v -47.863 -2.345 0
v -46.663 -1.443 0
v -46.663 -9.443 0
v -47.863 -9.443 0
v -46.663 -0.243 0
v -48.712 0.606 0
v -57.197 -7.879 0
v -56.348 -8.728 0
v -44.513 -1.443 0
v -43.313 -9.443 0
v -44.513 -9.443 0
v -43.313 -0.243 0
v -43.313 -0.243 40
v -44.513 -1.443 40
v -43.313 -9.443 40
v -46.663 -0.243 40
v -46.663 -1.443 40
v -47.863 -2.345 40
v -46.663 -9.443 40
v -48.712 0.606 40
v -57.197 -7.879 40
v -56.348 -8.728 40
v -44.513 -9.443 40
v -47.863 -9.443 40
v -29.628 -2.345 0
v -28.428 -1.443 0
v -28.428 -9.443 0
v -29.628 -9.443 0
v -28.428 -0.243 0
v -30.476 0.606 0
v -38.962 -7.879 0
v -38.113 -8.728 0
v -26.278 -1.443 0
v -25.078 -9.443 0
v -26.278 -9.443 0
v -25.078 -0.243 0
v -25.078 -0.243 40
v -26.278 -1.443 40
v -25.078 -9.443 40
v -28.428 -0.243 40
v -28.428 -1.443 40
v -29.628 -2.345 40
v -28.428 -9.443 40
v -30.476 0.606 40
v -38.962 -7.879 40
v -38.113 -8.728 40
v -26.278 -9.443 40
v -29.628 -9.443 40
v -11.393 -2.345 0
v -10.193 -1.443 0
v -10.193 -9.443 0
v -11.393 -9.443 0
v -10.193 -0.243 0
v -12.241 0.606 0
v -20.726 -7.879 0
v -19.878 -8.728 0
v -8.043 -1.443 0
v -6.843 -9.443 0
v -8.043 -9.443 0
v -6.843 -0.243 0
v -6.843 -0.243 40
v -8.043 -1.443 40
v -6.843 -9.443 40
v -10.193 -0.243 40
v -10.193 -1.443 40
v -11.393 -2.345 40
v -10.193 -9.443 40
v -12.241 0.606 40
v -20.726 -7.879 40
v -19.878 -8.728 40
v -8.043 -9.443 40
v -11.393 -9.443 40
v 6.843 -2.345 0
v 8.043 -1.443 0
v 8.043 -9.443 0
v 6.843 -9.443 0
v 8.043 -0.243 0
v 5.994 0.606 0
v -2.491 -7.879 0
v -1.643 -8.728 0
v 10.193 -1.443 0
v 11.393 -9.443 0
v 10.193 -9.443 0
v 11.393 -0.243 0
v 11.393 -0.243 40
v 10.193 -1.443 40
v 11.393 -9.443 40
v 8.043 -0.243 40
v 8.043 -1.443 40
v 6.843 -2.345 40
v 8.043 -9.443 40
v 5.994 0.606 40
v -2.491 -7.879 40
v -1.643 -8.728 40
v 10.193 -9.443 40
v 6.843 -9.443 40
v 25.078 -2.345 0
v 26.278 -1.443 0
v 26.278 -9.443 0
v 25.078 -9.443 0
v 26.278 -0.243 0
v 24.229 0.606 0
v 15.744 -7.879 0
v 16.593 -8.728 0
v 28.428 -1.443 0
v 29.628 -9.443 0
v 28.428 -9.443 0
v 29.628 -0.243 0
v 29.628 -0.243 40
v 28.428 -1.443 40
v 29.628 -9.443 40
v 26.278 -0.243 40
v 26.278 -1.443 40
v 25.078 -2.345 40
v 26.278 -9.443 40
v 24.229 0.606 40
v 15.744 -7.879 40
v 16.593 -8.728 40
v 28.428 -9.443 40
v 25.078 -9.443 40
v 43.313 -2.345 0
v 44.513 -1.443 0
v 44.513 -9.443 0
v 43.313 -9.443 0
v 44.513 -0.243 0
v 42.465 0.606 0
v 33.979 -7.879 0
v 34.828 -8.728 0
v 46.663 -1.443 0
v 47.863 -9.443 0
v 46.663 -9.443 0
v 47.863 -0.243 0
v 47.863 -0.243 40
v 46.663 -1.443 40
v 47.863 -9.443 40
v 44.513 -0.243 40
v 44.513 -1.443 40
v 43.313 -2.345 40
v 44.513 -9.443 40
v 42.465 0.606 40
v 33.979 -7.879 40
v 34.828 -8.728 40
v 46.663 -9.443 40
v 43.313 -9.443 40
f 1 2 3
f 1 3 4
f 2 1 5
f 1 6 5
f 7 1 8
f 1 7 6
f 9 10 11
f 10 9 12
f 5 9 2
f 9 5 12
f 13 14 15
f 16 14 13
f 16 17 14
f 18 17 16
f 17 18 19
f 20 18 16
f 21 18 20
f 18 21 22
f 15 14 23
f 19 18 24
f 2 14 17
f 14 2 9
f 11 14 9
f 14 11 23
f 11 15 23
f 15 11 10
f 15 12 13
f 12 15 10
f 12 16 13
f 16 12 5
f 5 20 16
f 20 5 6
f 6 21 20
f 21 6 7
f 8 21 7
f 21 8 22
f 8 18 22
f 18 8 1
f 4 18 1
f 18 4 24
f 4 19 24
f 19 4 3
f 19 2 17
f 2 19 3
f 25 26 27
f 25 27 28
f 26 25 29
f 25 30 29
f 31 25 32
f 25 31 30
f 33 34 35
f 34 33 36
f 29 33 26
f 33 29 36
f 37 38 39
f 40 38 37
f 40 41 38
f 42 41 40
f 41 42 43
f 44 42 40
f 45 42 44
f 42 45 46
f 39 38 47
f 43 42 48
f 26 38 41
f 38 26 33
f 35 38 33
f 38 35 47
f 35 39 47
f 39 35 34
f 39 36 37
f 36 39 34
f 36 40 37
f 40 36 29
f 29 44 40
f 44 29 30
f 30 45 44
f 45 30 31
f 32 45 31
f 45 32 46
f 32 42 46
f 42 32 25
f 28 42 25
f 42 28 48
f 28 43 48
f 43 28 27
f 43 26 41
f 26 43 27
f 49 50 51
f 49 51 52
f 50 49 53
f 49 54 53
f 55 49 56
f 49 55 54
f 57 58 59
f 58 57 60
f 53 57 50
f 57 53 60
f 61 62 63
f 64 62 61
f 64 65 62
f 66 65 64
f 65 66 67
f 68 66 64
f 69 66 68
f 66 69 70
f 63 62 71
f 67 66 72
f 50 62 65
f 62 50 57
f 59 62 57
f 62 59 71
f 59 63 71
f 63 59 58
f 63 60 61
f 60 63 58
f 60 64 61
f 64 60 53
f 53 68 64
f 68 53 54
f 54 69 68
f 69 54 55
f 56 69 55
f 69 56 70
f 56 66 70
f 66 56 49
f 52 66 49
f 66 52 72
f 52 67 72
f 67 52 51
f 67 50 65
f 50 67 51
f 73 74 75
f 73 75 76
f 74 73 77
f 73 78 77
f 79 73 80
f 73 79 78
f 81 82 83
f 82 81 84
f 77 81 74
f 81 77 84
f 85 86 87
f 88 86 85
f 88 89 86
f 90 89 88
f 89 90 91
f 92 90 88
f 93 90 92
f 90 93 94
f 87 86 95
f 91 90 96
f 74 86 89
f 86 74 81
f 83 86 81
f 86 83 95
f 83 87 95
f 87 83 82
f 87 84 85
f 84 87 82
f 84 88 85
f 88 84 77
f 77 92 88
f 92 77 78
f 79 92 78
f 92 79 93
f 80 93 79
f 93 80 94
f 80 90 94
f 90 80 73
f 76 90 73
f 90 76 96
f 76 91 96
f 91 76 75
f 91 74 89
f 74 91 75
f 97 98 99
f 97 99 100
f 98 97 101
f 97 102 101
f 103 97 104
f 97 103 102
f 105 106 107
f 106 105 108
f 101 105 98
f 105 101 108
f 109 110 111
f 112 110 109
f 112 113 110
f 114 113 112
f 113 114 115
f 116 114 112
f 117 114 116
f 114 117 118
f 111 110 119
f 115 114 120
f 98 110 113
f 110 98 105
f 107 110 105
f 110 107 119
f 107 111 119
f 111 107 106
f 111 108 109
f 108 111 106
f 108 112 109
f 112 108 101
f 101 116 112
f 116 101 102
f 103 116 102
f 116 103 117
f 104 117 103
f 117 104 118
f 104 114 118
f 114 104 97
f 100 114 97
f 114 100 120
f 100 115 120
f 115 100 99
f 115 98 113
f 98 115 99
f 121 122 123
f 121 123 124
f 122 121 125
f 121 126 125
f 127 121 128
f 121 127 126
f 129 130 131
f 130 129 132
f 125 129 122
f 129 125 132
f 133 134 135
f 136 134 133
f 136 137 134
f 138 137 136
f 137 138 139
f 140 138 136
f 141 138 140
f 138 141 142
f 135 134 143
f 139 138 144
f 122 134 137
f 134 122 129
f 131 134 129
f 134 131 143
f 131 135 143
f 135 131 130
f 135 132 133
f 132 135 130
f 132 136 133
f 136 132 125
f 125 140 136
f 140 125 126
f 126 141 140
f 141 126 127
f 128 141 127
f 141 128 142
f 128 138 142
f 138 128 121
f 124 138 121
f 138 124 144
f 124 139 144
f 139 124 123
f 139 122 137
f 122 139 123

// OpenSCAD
// Deutsche Version – automatisch erzeugt aus scad/label_clip.scad
// The Drawer Dividers V3 – Label clip
// Slides onto the top edge of a wall: write on it, add a sticker or engrave a text.

/* [Bauteil] */
// Text, der in die Schreibfläche graviert wird (leer = zum Beschriften)
Clip_Beschriftung = "";
// Breite des Clips entlang der Wand (mm)
Clip_Breite = 40; // [15:1:120]
// Höhe der schrägen Schreibfläche (mm)
Schildhoehe = 12; // [6:0.5:30]
// Neigung der Schreibfläche (Grad, 0 = senkrecht)
Schildwinkel = 45; // [0:5:80]
// Wie weit der Clip die Wand hinunter greift (mm)
Klemmtiefe = 8; // [3:0.5:20]
// Textgröße (mm)
Textgroesse = 5; // [2:0.5:15]
// Wie viele Teile auf dem Druckbett
Anzahl = 6; // [1:1:40]
// Abstand zwischen den Teilen (mm)
Abstand = 4; // [1:1:20]

/* [System] */
// Exakte Dicke deiner gedruckten Trennwände (mm)
Wand_Dicke = 2.0; // [0.8:0.1:10]
// Materialstärke des Clips (mm)
Clip_Wandstaerke = 1.2; // [0.6:0.1:3]
// Zusätzlicher Platz für die Wand – kleiner = strammer (mm)
Clip_Spiel = 0.15; // [0:0.05:0.6]

/* [Hidden] */
Clip_Text = Clip_Beschriftung;
Clip_Width = Clip_Breite;
Face_Height = Schildhoehe;
Face_Angle = Schildwinkel;
Grip_Depth = Klemmtiefe;
Text_Size = Textgroesse;
Count = Anzahl;
Spacing = Abstand;
Wall_Thickness = Wand_Dicke;
Clip_Wall = Clip_Wandstaerke;
Clip_Fit = Clip_Spiel;
$fn = 32;

P = dd_profile(wall_t = Wall_Thickness);
sz = dd_label_clip_size(P, Face_Height, Face_Angle, Grip_Depth, Clip_Wall);
dd_grid(Count, sz[0] + Spacing, sz[1] + Spacing)
    translate([0, Grip_Depth - sz[1] / 2, 0])
        dd_label_clip(Clip_Width, P, face = Face_Height, angle = Face_Angle, grip = Grip_Depth,
                      wall = Clip_Wall, fit = Clip_Fit, label = Clip_Text, text_size = Text_Size);

// ============================================================================
//  Library (scad/lib/drawer_divider.scad, inlined by tools/build.py)
// ============================================================================
// =============================================================================
//  The Drawer Dividers – core library (V3)
//  Usage:  use <lib/drawer_divider.scad>
//  All dimensions in mm. This file creates no geometry on its own.
// =============================================================================

DD_VERSION = "3.0.0";
DD_EPS = 0.01;

// =============================================================================
//  System profile
// =============================================================================
// Every part of one drawer is built from the same profile, so walls,
// connectors and rails always fit each other. A profile is a key/value list;
// read single values with dd(p, "key").

function dd_profile(
    wall_t   = 2.0,  // thickness of the printed walls
    tol      = 0.2,  // extra slot width so the wall does not bind
    height   = 40,   // connector height
    insert   = 14,   // how deep a wall slides into a connector arm
    shell    = 2.5,  // connector material left and right of the slot
    arm      = 20,   // arm length, measured from the connector centre
    fillet   = 10,   // inner fillet radius between two arms
    edge_r   = 0.6,  // rounding of the outer vertical edges
    cap      = 0,    // closed cap; 0 = slots open on both ends
    floor_t  = 2,    // cap thickness of slip-on connectors
    lead_in  = 1,    // chamfer at the open slot end
    efc      = 0.4,  // elephant foot compensation at the bed side
    magnet_d = 5,    // magnet / rubber foot pocket, 0 = off
    magnet_h = 2,
    end_gap  = 0.3,  // gap between wall end and pocket bottom
    top_gap  = 0.2   // gap between wall top and cap (capped connectors only)
) = [
    ["wall_t", wall_t], ["tol", tol], ["height", height], ["insert", insert],
    ["shell", shell], ["arm", arm], ["fillet", fillet], ["edge_r", edge_r],
    ["cap", cap], ["floor_t", floor_t], ["lead_in", lead_in], ["efc", efc],
    ["magnet_d", magnet_d], ["magnet_h", magnet_h], ["end_gap", end_gap],
    ["top_gap", top_gap]
];

function dd(p, key) =
    let(i = search([key], p)[0])
    assert(is_num(i), str("dd(): unknown profile key '", key, "'"))
    p[i][1];

// ---- derived values (the designer uses the same formulas) -------------------
// centre distance two connectors on one wall need so their arms do not collide
function dd_min_conn_gap(p) = 2 * dd(p, "arm") + 1;
function dd_slot_w(p)       = dd(p, "wall_t") + dd(p, "tol");
function dd_arm_w(p)        = dd_slot_w(p) + 2 * dd(p, "shell");
function dd_pocket_start(p) = dd(p, "arm") - dd(p, "insert");
// distance from a connector centre to the end of a fully inserted wall
function dd_wall_inset(p)   = dd_pocket_start(p) + dd(p, "end_gap");
function dd_cap(p, slip = false) =
    slip ? max(dd(p, "cap"), dd(p, "floor_t")) : dd(p, "cap");
function dd_wall_height(p, slip = false) =
    let(c = dd_cap(p, slip))
    dd(p, "height") - (c > 0 ? c + dd(p, "top_gap") : 0);
// wall length for two connector centres `center_dist` apart
function dd_wall_length(center_dist, p, ends = 2) =
    center_dist - ends * dd_wall_inset(p);

// =============================================================================
//  Connectors
// =============================================================================
// Directions: 0 = +X, 1 = +Y, 2 = -X, 3 = -Y.
// Definition: [arms, slots, through_y, slip_on]
//   through_y: one continuous slot along Y (the wall passes straight through)
//   slip_on:   printed cap-down, then flipped and pushed onto the walls

function dd_connector_types() = ["cross", "tee", "corner", "corner_round", "straight", "end",
                                  "slip_cross", "slip_tee", "slip_corner_r", "slip_corner_l"];

function dd_connector_def(type) =
    type == "cross"         ? [[1,1,1,1], [1,1,1,1], false, false] :
    type == "tee"           ? [[1,1,1,0], [1,1,1,0], false, false] :
    type == "corner"        ? [[1,1,0,0], [1,1,0,0], false, false] :
    type == "corner_round"  ? [[1,1,0,0], [1,1,0,0], false, false] :   // frame corner, use corner_r
    type == "straight"      ? [[1,0,1,0], [1,0,1,0], false, false] :
    type == "end"           ? [[1,0,0,0], [1,0,0,0], false, false] :
    type == "slip_cross"    ? [[1,1,1,1], [1,1,1,1], true,  true ] :
    type == "slip_tee"      ? [[1,1,0,1], [1,1,0,1], true,  true ] :
    type == "slip_corner_r" ? [[1,1,0,0], [1,1,0,1], true,  true ] :
    type == "slip_corner_l" ? [[0,1,1,0], [0,1,1,1], true,  true ] :
    undef;

// slip = true: part of a slip-on set. Every connector of the set gets the cap and
// is pushed on from above, also where the walls end instead of running through.
// corner_r rounds the outer corner, so a frame corner fits a drawer with rounded
// corners (see dd_corner_r_max()).
module dd_connector(type = "cross", p = dd_profile(), slip = false, corner_r = 0) {
    def = dd_connector_def(type);
    assert(!is_undef(def), str("dd_connector(): unknown type '", type, "'"));
    dd_connector_custom(arms = def[0], slots = def[1], through_y = def[2],
                        cap = dd_cap(p, def[3] || slip), p = p, corner_r = corner_r);
}

// largest outer corner radius that still leaves 0.8 mm beside the slots
function dd_corner_r_max(p) =
    let(a = dd_arm_w(p) / 2, dx = dd_pocket_start(p) + a, dy = a - dd_slot_w(p) / 2 - 0.8)
    dy <= 0 ? dx : dx + dy + sqrt(2 * dx * dy);

// Build any connector from an arm/slot pattern.
module dd_connector_custom(arms = [1,1,1,1], slots = undef, through_y = false,
                           cap = 0, p = dd_profile(), corner_r = 0) {
    sl  = is_undef(slots) ? arms : slots;
    h   = dd(p, "height");
    aw  = dd_arm_w(p);
    arm = dd(p, "arm");
    ps  = dd_pocket_start(p);
    md  = dd(p, "magnet_d");
    z0  = cap > 0 ? cap : -1;   // slots start above the cap

    difference() {
        linear_extrude(h) dd_connector_outline(arms, p, corner_r);

        for (i = [0:3]) if (sl[i] && !(through_y && i == 3))
            rotate(90 * i)
                dd_slot_cut(x0 = (through_y && i == 1) ? -(arm + 1) : ps,
                            x1 = arm + 1, z0 = z0, p = p);

        // magnet pocket on the side that faces the drawer floor in use
        if (!through_y && md > 0 && md <= min(aw, 2 * ps) - 1) {
            mh = dd(p, "magnet_h");
            if (cap > 0) translate([0, 0, h - mh]) cylinder(d = md, h = mh + 1, $fn = 48);
            else translate([0, 0, -DD_EPS]) cylinder(d = md, h = mh + DD_EPS, $fn = 48);
        }
    }
}

module dd_connector_outline(arms, p, corner_r = 0) {
    aw = dd_arm_w(p);
    rc = min(corner_r, dd_corner_r_max(p));
    difference() {
        dd_round_convex(dd(p, "edge_r"))
        // a fillet longer than the free arm would swallow the arm ends
        dd_round_concave(min(dd(p, "fillet"), dd(p, "arm") - aw / 2))
        union() {
            square(aw, center = true);
            for (i = [0:3]) if (arms[i])
                rotate(90 * i) translate([0, -aw / 2]) square([dd(p, "arm"), aw]);
        }
        // outer corners between two missing arms
        if (rc > 0) for (i = [0:3]) if (!arms[i] && !arms[(i + 1) % 4])
            rotate(90 * i) translate([aw / 2 - rc, aw / 2 - rc]) difference() {
                square(rc + 1);
                circle(r = rc, $fn = 64);
            }
    }
}

// one slot along +X from x0 to x1, open at the top
module dd_slot_cut(x0, x1, z0, p) {
    h    = dd(p, "height");
    sw   = dd_slot_w(p);
    li   = dd(p, "lead_in");
    efc  = dd(p, "efc");
    len  = x1 - x0;

    translate([x0, -sw / 2, z0]) cube([len, sw, h - z0 + 1]);

    if (li > 0) hull() {
        translate([x0, -sw / 2, h - li]) cube([len, sw, DD_EPS]);
        translate([x0, -sw / 2 - li, h]) cube([len, sw + 2 * li, 1]);
    }
    // only where the slot touches the print bed
    if (z0 < 0 && efc > 0) hull() {
        translate([x0, -sw / 2 - efc, -1]) cube([len, sw + 2 * efc, 1]);
        translate([x0, -sw / 2, efc]) cube([len, sw, DD_EPS]);
    }
}

// footprint size, used to space copies on the plate
function dd_connector_size(p) = 2 * dd(p, "arm");

// A connector as it sits in the drawer (cap on top), for assembly previews.
// The slots stay open so the walls show inside them; through = "x"|"y"|"" for slip-on.
module dd_connector_installed(arms, through = "", cap = 0, p = dd_profile(), corner_r = 0) {
    h   = dd(p, "height");
    arm = dd(p, "arm");
    ps  = dd_pocket_start(p);
    sw  = dd_slot_w(p);
    linear_extrude(h - cap) difference() {
        dd_connector_outline(arms, p, corner_r);
        for (i = [0:3]) if (arms[i])
            rotate(90 * i) translate([ps, -sw / 2]) square([arm + 1 - ps, sw]);
        if (through != "")
            rotate(through == "x" ? 0 : 90) square([2 * arm + 2, sw], center = true);
    }
    if (cap > 0) translate([0, 0, h - cap]) linear_extrude(cap) dd_connector_outline(arms, p, corner_r);
}

// =============================================================================
//  Walls
// =============================================================================
// Built standing: X = length, Y = thickness (centred), Z = height.

// label / label2: engraved into the wall ends that disappear in the connectors,
// label upright at +X (the parts-list letter), label2 running upwards at -X (the length).
module dd_wall(length, p = dd_profile(), height = undef, pattern = "none",
               cell = 8, web = 2, margin_side = -1, margin_tb = 5,
               end_chamfer = 0.5, grip = 0, label = "", label2 = "") {
    h  = is_undef(height) ? dd_wall_height(p) : height;
    t  = dd(p, "wall_t");
    // keep the pattern out of the connector pockets
    ms = margin_side < 0 ? dd(p, "insert") + 2 : margin_side;

    difference() {
        linear_extrude(h) dd_wall_2d(length, t, end_chamfer);
        dd_wall_pattern(length, t, h, pattern, cell, web, ms,
                        margin_tb, margin_tb + grip);
        if (grip > 0)
            translate([0, 0, h]) rotate([90, 0, 0])
                cylinder(r = grip, h = t + 2, center = true, $fn = 48);
        dd_wall_labels(length, t, h, dd(p, "insert") - dd(p, "end_gap"), label, label2);
    }
}

module dd_wall_labels(l, t, h, lw, label, label2) {
    dep = min(0.4, t / 4);
    both = l >= 2 * lw + 2;
    module engrave(x, z, s, txt, up)
        translate([x, -t / 2 + dep, z]) rotate([90, 0, 0]) linear_extrude(dep + 1)
            rotate(up ? 90 : 0) text(txt, size = s, halign = "center", valign = "center");
    if (label != "") {
        s = min(7, (both ? lw : l) - 4, h / 3);
        if (s >= 2) engrave(both ? l / 2 - lw / 2 : 0, h / 2, s, label, false);
    }
    if (label2 != "" && both) {
        s = min(4, lw - 4, (h - 8) / (0.75 * len(label2) + 1));
        if (s >= 2) engrave(-l / 2 + lw / 2, h / 2, s, label2, true);
    }
}

module dd_wall_2d(l, t, c) {
    ce = min(c, t / 2 - 0.01);
    if (ce > 0)
        polygon([
            [-l/2 + ce, -t/2], [ l/2 - ce, -t/2], [ l/2, -t/2 + ce], [ l/2,  t/2 - ce],
            [ l/2 - ce,  t/2], [-l/2 + ce,  t/2], [-l/2,  t/2 - ce], [-l/2, -t/2 + ce]
        ]);
    else
        square([l, t], center = true);
}

// Hex or circle pattern with a constant web between the holes.
module dd_wall_pattern(l, t, h, pattern, cell, web, ms, mb, mt) {
    if (pattern == "hex" || pattern == "circle") {
        hex   = pattern == "hex";
        D     = hex ? cell * sqrt(3) + web : 2 * cell + web;  // vertical pitch
        ext_x = cell;
        ext_z = hex ? cell * sqrt(3) / 2 : cell;
        max_w = l - 2 * ms - 2 * ext_x;
        max_h = h - mb - mt - 2 * ext_z;
        stagger = max_h >= D / 2;
        sx    = stagger ? D * sqrt(3) / 2 : 2 * cell + web;
        cols  = max_w >= 0 ? floor(max_w / sx) + 1 : 0;
        st    = stagger && cols > 1;
        rows  = max_h >= 0 ? floor((max_h - (st ? D / 2 : 0)) / D) + 1 : 0;

        if (cols > 0 && rows > 0) {
            pw = (cols - 1) * sx;
            ph = (rows - 1) * D + (st ? D / 2 : 0);
            z0 = mb + ext_z + (max_h - ph) / 2;
            for (c = [0 : cols - 1], r = [0 : rows - 1])
                translate([-pw / 2 + c * sx, 0, z0 + r * D + (st && c % 2 == 1 ? D / 2 : 0)])
                    rotate([90, 0, 0])
                        cylinder(r = cell, h = t + 2, center = true, $fn = hex ? 6 : 32);
        }
    }
}

// =============================================================================
//  Rails ("Raster Wall") – glued or screwed to the drawer side
// =============================================================================
// Built flat: X = length, Y = width (= height in the drawer), Z = thickness.
// Teeth form slots of the system slot width. teeth_offset = position of the
// first tooth from x = 0; -1 centres the pattern. Joined rails use explicit
// offsets so the slot pitch continues across the joint.

function dd_rail_pitch(p, tooth_t = 2) = tooth_t + dd_slot_w(p);

function dd_rail_center_offset(length, p, tooth_t = 2) =
    let(sw = dd_slot_w(p), pitch = tooth_t + sw,
        n = max(1, floor((length + sw) / pitch)),
        used = n * tooth_t + (n - 1) * sw)
    (length - used) / 2;

module dd_rail(length, width, p = dd_profile(), plate = 2.5, tooth_t = 2,
               tooth_h = 6, tooth_chamfer = 0.6, tooth_fillet = 0.5,
               teeth_offset = -1, teeth = true, tongue = true, socket = true,
               tongue_len = 2, tongue_w = -1, tongue_chamfer = 1,
               tol_w = 1, tol_d = 0.5, tol_z = 0.1,
               screws = 3, screw_d = 3.2, head_d = 6.5) {
    sw    = dd_slot_w(p);
    pitch = tooth_t + sw;
    x0    = teeth_offset >= 0 ? teeth_offset : dd_rail_center_offset(length, p, tooth_t);
    n     = floor((length - x0 - tooth_t) / pitch) + 1;
    tw    = tongue_w < 0 ? max(width - 12, width * 0.6) : min(tongue_w, width - 4);
    zt    = plate / 2 - tol_z / 2;
    zs    = plate / 2 + tol_z / 2;

    difference() {
        union() {
            cube([length, width, plate]);
            if (tongue)
                translate([length, (width - tw) / 2, 0]) linear_extrude(zt)
                    polygon([[0, 0], [tongue_len, tongue_chamfer],
                             [tongue_len, tw - tongue_chamfer], [0, tw]]);
            if (teeth && n > 0)
                for (i = [0 : n - 1])
                    translate([x0 + i * pitch, 0, plate - DD_EPS])
                        dd_rail_tooth(width, tooth_t, tooth_h, tooth_chamfer, tooth_fillet);
        }
        if (socket) {
            bw = tw + 2 * tol_w;
            translate([-DD_EPS, (width - bw) / 2, -DD_EPS])
                cube([tongue_len + tol_d + DD_EPS, bw, zs + DD_EPS]);
        }
        // screws sit in the middle of a slot so they damage as few teeth as possible
        if (screws > 0) for (s = [1 : screws]) {
            // nearest slot, kept on the rail when it is short
            k  = max(0, min(n - 2, round((length * s / (screws + 1) - x0 - tooth_t - sw / 2) / pitch)));
            xs = x0 + tooth_t + sw / 2 + k * pitch;
            cs = min(1.5, plate - 0.4);
            translate([xs, width / 2, 0]) {
                translate([0, 0, -1]) cylinder(d = screw_d, h = plate + 2, $fn = 32);
                translate([0, 0, plate - cs]) cylinder(d1 = screw_d, d2 = head_d, h = cs + DD_EPS, $fn = 32);
                translate([0, 0, plate]) cylinder(d = head_d + 0.5, h = tooth_h + 1, $fn = 32);
            }
        }
    }
}

// One tooth across the full rail width, with lead-in chamfer and base fillets.
// Keep tooth_fillet <= the wall end chamfer so walls still reach the plate.
module dd_rail_tooth(width, tt, th, ch, fr) {
    c = max(0, min(ch, tt / 2 - 0.2, th - 0.5));
    translate([0, width, 0]) rotate([90, 0, 0]) linear_extrude(width) {
        polygon([[0, 0], [tt, 0], [tt, th - c], [tt - c, th], [c, th], [0, th - c]]);
        if (fr > 0) {
            translate([tt, 0]) dd_fillet_2d(fr);
            mirror([1, 0]) dd_fillet_2d(fr);
        }
    }
}

// =============================================================================
//  Label clip
// =============================================================================
// Slides onto the top edge of a wall; the slanted face takes a marker, a sticker
// or an engraved text. Built in print orientation: the profile lies on the bed
// (X = across the wall, Y = up in use) and is extruded by the clip width.

module dd_label_clip(width = 40, p = dd_profile(), face = 12, angle = 45, grip = 8,
                     wall = 1.2, fit = 0.15, label = "", text_size = 5) {
    gap = dd(p, "wall_t") + fit;
    d   = [-cos(angle), -sin(angle)];   // down the face, away from the wall
    n   = [-sin(angle),  cos(angle)];   // face normal
    hp  = [-gap / 2 - wall, wall];      // hinge: top front corner of the clip
    difference() {
        linear_extrude(width) {
            difference() {
                translate([-gap / 2 - wall, -grip]) square([gap + 2 * wall, grip + wall]);
                translate([-gap / 2, -grip - 1]) square([gap, grip + 1]);
            }
            // the hull fills the joint, so face and clip share more than one edge
            hull() {
                translate(hp - [0, wall]) square([wall, wall]);
                polygon([hp, hp + face * d, hp + face * d + wall * n, hp + wall * n]);
            }
        }
        if (label != "") {
            c = hp + wall * n + d * face / 2;
            dep = min(0.4, wall / 3);
            multmatrix([[0, -d[0], n[0], c[0]], [0, -d[1], n[1], c[1]], [1, 0, 0, width / 2], [0, 0, 0, 1]])
                translate([0, 0, -dep]) linear_extrude(dep + 1)
                    text(label, size = min(text_size, face - 3), halign = "center", valign = "center");
        }
    }
}

// footprint of one clip on the bed (x, y)
function dd_label_clip_size(p, face = 12, angle = 45, grip = 8, wall = 1.2) =
    [dd(p, "wall_t") + 0.15 + 2 * wall + face * cos(angle) + wall, grip + wall + face * sin(angle) + wall];

// =============================================================================
//  Tolerance test
// =============================================================================
// A bar with one slot per tolerance (value engraved next to it) plus a short
// test wall. Print both, find the slot that fits best, use that tolerance.

module dd_tolerance_test(p = dd_profile(), tols = [0.1, 0.15, 0.2, 0.25, 0.3],
                         height = 12, depth = 20, land = 8, base = 1.2,
                         coupon = true) {
    t = dd(p, "wall_t");
    n = len(tols);
    function x_at(i) = land * (i + 1) + i * t + dd_sum(tols, i);
    L = x_at(n);

    difference() {
        cube([L, depth, height]);
        for (i = [0 : n - 1]) {
            translate([x_at(i), -1, base]) cube([t + tols[i], depth + 2, height]);
            translate([x_at(i) - land / 2, depth / 2, height - 0.6])
                linear_extrude(1) rotate(90)
                    text(str(tols[i]), size = min(3.2, land * 0.42),
                         halign = "center", valign = "center");
        }
    }
    if (coupon)
        translate([L / 2, depth + 8, 0])
            dd_wall(30, p, height = height + 4, end_chamfer = 0.3);
}

// =============================================================================
//  Helpers
// =============================================================================

function dd_sum(v, n) = n <= 0 ? 0 : v[n - 1] + dd_sum(v, n - 1);

module dd_round_concave(r) { if (r > 0) offset(r = -r) offset(r = r) children(); else children(); }
module dd_round_convex(r)  { if (r > 0) offset(r = r) offset(delta = -r) children(); else children(); }

module dd_fillet_2d(r) {
    difference() {
        square([r, r]);
        translate([r, r]) circle(r = r, $fn = 24);
    }
}

// Arrange `count` copies of the child in rows that fit max_w, centred on the origin.
module dd_grid(count, pitch_x, pitch_y, max_w = 240) {
    cols = max(1, min(count, floor((max_w + DD_EPS) / pitch_x)));
    rows = ceil(count / cols);
    for (i = [0 : count - 1])
        translate([((i % cols) - (cols - 1) / 2) * pitch_x,
                   (floor(i / cols) - (rows - 1) / 2) * pitch_y, 0])
            children();
}

// Lay a standing wall flat on the bed.
module dd_lay_flat(t) { translate([0, 0, t / 2]) rotate([90, 0, 0]) children(); }

// =============================================================================
//  Drawer layout – used by drawer_designer.scad
// =============================================================================
// The drawer is cut into strips (u axis), each strip into compartments
// (v axis). Strip walls run through from edge to edge. Strips run front to
// back unless `swap` is set. dd_layout() works in u/v and returns world
// coordinates: x = width, y = depth, front edge at y = 0.
// Directions: 0 = +X, 1 = +Y, 2 = -X, 3 = -Y.

function dd_le() = 0.01;   // a function, so inlined single files can use it before this line

// ---- string parsing ("1,1,2" and "2,1:2") ----------------------------------
function dd_str_split(s, sep, i = 0, cur = "", acc = []) =
    i >= len(s) ? concat(acc, [cur])
  : s[i] == sep ? dd_str_split(s, sep, i + 1, "", concat(acc, [cur]))
  : dd_str_split(s, sep, i + 1, str(cur, s[i]), acc);

function dd_str_num(s) = dd__num([for (c = s) if (c != " ") c], 0, 0, 0, 1);
function dd__num(c, i, v, frac, sign) =
    i >= len(c) ? sign * v
  : c[i] == "-" ? dd__num(c, i + 1, v, frac, -1)
  : c[i] == "." ? dd__num(c, i + 1, v, max(frac, 0.1), sign)
  : let(d = ord(c[i]) - 48)
    d < 0 || d > 9 ? dd__num(c, i + 1, v, frac, sign)
  : frac > 0 ? dd__num(c, i + 1, v + d * frac, frac / 10, sign)
             : dd__num(c, i + 1, v * 10 + d, 0, sign);

// "1,1,2" -> [1,1,2]
function dd_parse_weights(s) =
    let(v = [for (p = dd_str_split(s, ",")) let(n = dd_str_num(p)) if (n > 0) n])
    len(v) ? v : [1];

// "2,1:2" -> one weight list per strip; a plain number n = n equal parts.
// Missing entries repeat the last one.
function dd_parse_splits(s, n) =
    let(per = [for (it = dd_str_split(s, ","))
                  let(p = [for (x = dd_str_split(it, ":")) let(v = dd_str_num(x)) if (v > 0) v])
                  len(p) == 0 ? [1]
                : len(p) == 1 ? [for (k = [1 : max(1, round(p[0]))]) 1] : p])
    [for (i = [0 : n - 1]) per[min(i, len(per) - 1)]];

// ---- small list helpers ----------------------------------------------------
function dd_has_num(l, x) = len([for (y = l) if (abs(y - x) < dd_le()) 1]) > 0;
function dd_sort(a) =
    len(a) <= 1 ? a :
    let(p = a[floor(len(a) / 2)])
    concat(dd_sort([for (x = a) if (x < p) x]), [for (x = a) if (x == p) x], dd_sort([for (x = a) if (x > p) x]));
function dd_uniq_sorted(l) = [for (k = [0 : 1 : len(l) - 1]) if (k == 0 || l[k] - l[k - 1] > dd_le()) l[k]];
function dd_unique(l, i = 0, acc = []) =
    i >= len(l) ? acc : dd_unique(l, i + 1, len([for (y = acc) if (y == l[i]) 1]) ? acc : concat(acc, [l[i]]));
function dd_count(l, x) = len([for (y = l) if (y == x) 1]);
function dd_nearest(l, v) = len(l) == 0 ? v : let(d = [for (x = l) abs(x - v)]) l[search(min(d), d)[0]];
function dd_fmt(v, d = 1) = str(round(v * pow(10, d)) / pow(10, d));

// ---- options ---------------------------------------------------------------
function dd_layout_opts(width = 400, depth = 300, height = 60, strips = "1,1,1",
                        splits = "2", swap = false, edge = "frame", slip = false,
                        max_len = 240, edge_gap = 0.5, clamp_gap = 1,
                        rail_plate = 2.5, tooth_t = 2, tooth_h = 6, corner_r = 0) = [
    ["width", width], ["depth", depth], ["height", height], ["strips", strips],
    ["splits", splits], ["swap", swap], ["edge", edge], ["slip", slip],
    ["max_len", max_len], ["edge_gap", edge_gap], ["clamp_gap", clamp_gap],
    ["rail_plate", rail_plate], ["tooth_t", tooth_t], ["tooth_h", tooth_h], ["corner_r", corner_r]
];

// outer radius of the frame corners for a drawer with rounded inner corners
function dd_layout_corner_r(p, o) =
    dd(o, "edge") == "frame" && dd(o, "corner_r") > 0
        ? max(0, min(dd(o, "corner_r") - dd(o, "edge_gap"), dd_corner_r_max(p))) : 0;

// Rail tooth pattern along one world axis. Rails on the left/right sides run
// the full depth; front/back rails sit between them.
function dd_lay_rail_span(axis, W, D, rt) =
    axis == "y" ? [0.5, D - 1] : [rt + 0.5, W - 2 * rt - 1];

function dd_lay_rail_slots(axis, W, D, rt, tt, p) =
    let(sp = dd_lay_rail_span(axis, W, D, rt), sw = dd_slot_w(p), pitch = tt + sw,
        n = max(1, floor((sp[1] + sw) / pitch)),
        first = sp[0] + dd_rail_center_offset(sp[1], p, tt))
    [for (k = [0 : 1 : n - 2]) first + tt + sw / 2 + k * pitch];

// interior wall centres between c0 and c1 so the *net* compartments follow the weights
function dd_lay_split(c0, c1, off, w, t) =
    let(n = len(w), net = (c1 - off) - (c0 + off) - (n - 1) * t, tot = dd_sum(w, n))
    [for (k = [1 : 1 : n - 1]) c0 + off + net * dd_sum(w, k) / tot + (k - 1) * t + t / 2];

// node: [u, v, dirs, kind ("conn"|"edge"), type, through ("u"|"v"|""), end offset, joint]
function dd_lay_node(u, v, d, edge, slip, end_off, joint = false) =
    let(n = d[0] + d[1] + d[2] + d[3])
    n == 1 && (edge == "rail" || edge == "none") ? [u, v, d, "edge", "", "", end_off, false] :
    let(t0 = n == 4 ? "cross" : n == 3 ? "tee" : n == 1 ? "end"
           : (d[0] == 1 && d[2] == 1) || (d[1] == 1 && d[3] == 1) ? "straight" : "corner",
        th = slip && n >= 3 ? (d[1] == 1 && d[3] == 1 ? "v" : "u") : "")
    [u, v, d, "conn", th == "" ? t0 : (n == 4 ? "slip_cross" : "slip_tee"), th, 0, joint];

// slip-on: positions along a through wall where it should end at a crossing instead of
// getting a joiner squeezed between two connectors (greedy, each piece <= maxlen)
function dd_lay_slip_cuts(stops, prev, last, ins, maxlen, acc = []) =
    last - prev - 2 * ins <= maxlen ? acc :
    let(ok = [for (u = stops) if (u > prev + dd_le() && u < last - dd_le() && u - prev - 2 * ins <= maxlen) u])
    len(ok) == 0 ? acc : dd_lay_slip_cuts(stops, max(ok), last, ins, maxlen, concat(acc, [max(ok)]));

function dd_lay_find(nodes, u, v) =
    let(m = [for (n = nodes) if (abs(n[0] - u) < dd_le() && abs(n[1] - v) < dd_le()) n]) m[0];

function dd_lay_align(v, m, i = 0, acc = []) =
    i >= len(v) ? acc :
    dd_lay_align(v, m, i + 1, concat(acc, [i == 0 ? v[0] :
        [for (y = v[i]) let(prev = acc[i - 1], d = [for (q = prev) abs(q - y)])
            len(prev) && min(d) < m ? prev[search(min(d), d)[0]] : y]]));

function dd_lay_off(n, ins) = n[3] == "edge" ? n[6] : ins;

// joints that split a too long wall, kept clear of other connectors on the line
function dd_lay_kpieces(total, ins, maxlen, k = 1) =
    (total - (k - 1) * 2 * ins) / k <= maxlen || k >= 50 ? k : dd_lay_kpieces(total, ins, maxlen, k + 1);

function dd_lay_joints(u0, u1, o0, o1, ins, maxlen, avoid, clear) =
    let(total = u1 - u0 - o0 - o1, k = dd_lay_kpieces(total, ins, maxlen),
        pl = (total - (k - 1) * 2 * ins) / k)
    k <= 1 ? [] : dd__joints(1, k, u0 + o0, pl, ins, maxlen, avoid, clear, []);

function dd__joints(j, k, start, pl, ins, maxlen, avoid, clear, acc) =
    j >= k ? acc :
    let(ideal = start + j * pl + (2 * j - 1) * ins,
        prev  = len(acc) ? acc[len(acc) - 1] + ins : start,
        cands = [for (d = [0 : 2.5 : 80], c = [ideal + d, ideal - d])
                    if (len([for (a = avoid) if (abs(a - c) < clear) 1]) == 0 && c - ins - prev <= maxlen) c])
    dd__joints(j + 1, k, start, pl, ins, maxlen, avoid, clear, concat(acc, [len(cands) ? cands[0] : ideal]));

// cuts: [[u, offset], ...] -> [pieces [[ori, c, s, e]], joints [[ori, c, u]]]
function dd_lay_line(ori, c, cuts, avoid, ins, maxlen, clear) =
    let(segs = [for (k = [0 : 1 : len(cuts) - 2])
        let(u0 = cuts[k][0], o0 = cuts[k][1], u1 = cuts[k + 1][0], o1 = cuts[k + 1][1],
            js = dd_lay_joints(u0, u1, o0, o1, ins, maxlen,
                               [for (a = avoid) if (a > u0 + dd_le() && a < u1 - dd_le()) a], clear),
            b  = concat([u0 + o0], [for (jc = js) each [jc - ins, jc + ins]], [u1 - o1]))
        [[for (m = [0 : 2 : len(b) - 2]) [ori, c, b[m], b[m + 1]]], js]])
    [[for (s = segs) each s[0]], [for (s = segs) for (jc = s[1]) [ori, c, jc]]];

// Returns a key/value list:
//   walls  [[axis "x"|"y", c, start, end, length], ...]   axis = direction the wall runs
//   conns  [[type, x, y, dirs, through "x"|"y"|"", joint], ...]
//   rails  [[side "L"|"R"|"F"|"B", start, end, length, teeth_offset, tongue, socket, screws], ...]
//   comps  [[x0, y0, x1, y1, net_w, net_d], ...]
//   wall_h, rail_w, rail_t, inset
function dd_layout(p, o) =
    let(
        W = dd(o, "width"), D = dd(o, "depth"), swap = dd(o, "swap"),
        U = swap ? D : W, V = swap ? W : D,
        edge = dd(o, "edge"), slip = dd(o, "slip"), frame = edge == "frame", rail = edge == "rail",
        maxlen = dd(o, "max_len"),
        t = dd(p, "wall_t"), aw = dd_arm_w(p), ins = dd_wall_inset(p),
        tt = dd(o, "tooth_t"), rt = dd(o, "rail_plate") + dd(o, "tooth_h"),
        B = (frame || edge == "endcap") ? aw / 2 + dd(o, "edge_gap") : 0,
        base = frame ? B : 0,
        eoff = frame ? t / 2 : rail ? rt : 0,
        end_off = rail ? dd(o, "rail_plate") + dd(p, "end_gap") : dd(o, "clamp_gap"),
        clear = 2 * dd(p, "arm") + 2,
        cols = dd_parse_weights(dd(o, "strips")), ncol = len(cols),
        rows = dd_parse_splits(dd(o, "splits"), ncol),
        su = rail ? dd_lay_rail_slots(swap ? "y" : "x", W, D, rt, tt, p) : [],
        sv = rail ? dd_lay_rail_slots(swap ? "x" : "y", W, D, rt, tt, p) : [],
        us = concat([base], [for (x = dd_lay_split(base, U - base, eoff, cols, t)) rail ? dd_nearest(su, x) : x], [U - base]),
        // compartment borders that almost line up with the neighbouring strip snap onto it,
        // otherwise the arms of the two connectors on the strip wall would collide
        vsi = dd_lay_align([for (i = [0 : ncol - 1])
                  [for (y = dd_lay_split(base, V - base, eoff, rows[i], t)) rail ? dd_nearest(sv, y) : y]],
                  dd_min_conn_gap(p)),

        // nodes on the through-running strip walls (and the frame sides)
        vjs = frame ? [for (j = [0 : ncol]) j] : [for (j = [1 : 1 : ncol - 1]) j],
        vstops = [for (j = [0 : ncol])
                     dd_uniq_sorted(dd_sort(concat([B, V - B], j >= 1 ? vsi[j - 1] : [], j < ncol ? vsi[j] : [])))],
        // slip-on: crossings where too long through walls end (they become normal connectors)
        vcut = [for (j = [0 : ncol]) slip ? dd_lay_slip_cuts(vstops[j], B, V - B, ins, maxlen) : []],
        fcut = slip && frame ? dd_lay_slip_cuts([for (k = [1 : 1 : ncol - 1]) us[k]], us[0], us[ncol], ins, maxlen) : [],
        vnodes = [for (j = vjs, v = vstops[j])
            let(isEnd = abs(v - B) < dd_le() || abs(v - (V - B)) < dd_le(),
                slipHere = slip && !(isEnd ? dd_has_num(fcut, us[j]) : dd_has_num(vcut[j], v)),
                d = [(j < ncol && dd_has_num(vsi[j], v)) || (frame && isEnd && j < ncol) ? 1 : 0,
                     v < V - B - dd_le() ? 1 : 0,
                     (j >= 1 && dd_has_num(vsi[j - 1], v)) || (frame && isEnd && j > 0) ? 1 : 0,
                     v > B + dd_le() ? 1 : 0])
            dd_lay_node(us[j], v, d, edge, slipHere, end_off)],
        // compartment walls that end at the drawer side
        hnodes = frame ? [] : concat(
            [for (v = vsi[0]) dd_lay_node(B, v, [1, 0, 0, 0], edge, slip, end_off)],
            [for (v = vsi[ncol - 1]) dd_lay_node(U - B, v, [0, 0, 1, 0], edge, slip, end_off)]),
        nodes = concat(vnodes, hnodes),

        vlines = [for (j = vjs)
            dd_lay_line("v", us[j],
                [for (v = vstops[j]) let(n = dd_lay_find(nodes, us[j], v))
                    if (abs(v - B) < dd_le() || abs(v - (V - B)) < dd_le() || n[5] != "v") [v, dd_lay_off(n, ins)]],
                vstops[j], ins, maxlen, clear)],
        hlines = [for (i = [0 : ncol - 1], v = vsi[i])
            let(ua = i == 0 ? B : us[i], ub = i == ncol - 1 ? U - B : us[i + 1])
            dd_lay_line("u", v, [[ua, dd_lay_off(dd_lay_find(nodes, ua, v), ins)],
                                 [ub, dd_lay_off(dd_lay_find(nodes, ub, v), ins)]],
                        [], ins, maxlen, clear)],
        flines = frame ? [for (v = [B, V - B])
            dd_lay_line("u", v, [for (k = [0 : ncol]) if (k == 0 || k == ncol || !slip || dd_has_num(fcut, us[k])) [us[k], ins]],
                        us, ins, maxlen, clear)] : [],
        lines = concat(vlines, hlines, flines),
        pieces = [for (l = lines) each l[0]],
        joints = [for (l = lines, jn = l[1])
            dd_lay_node(jn[0] == "u" ? jn[2] : jn[1], jn[0] == "u" ? jn[1] : jn[2],
                        jn[0] == "u" ? [1, 0, 1, 0] : [0, 1, 0, 1], edge, false, 0, true)],
        lconns = concat([for (n = nodes) if (n[3] == "conn") n], joints),

        // world coordinates
        walls = [for (pc = pieces)
            [(pc[0] == "u") != swap ? "x" : "y", pc[1], pc[2], pc[3], pc[3] - pc[2]]],
        cr = dd_layout_corner_r(p, o),
        isCorner = function(n) n[4] == "corner" && cr > 0
            && (abs(n[0] - B) < dd_le() || abs(n[0] - (U - B)) < dd_le())
            && (abs(n[1] - B) < dd_le() || abs(n[1] - (V - B)) < dd_le()),
        conns = [for (n = lconns)
            [isCorner(n) ? "corner_round" : n[4], swap ? n[1] : n[0], swap ? n[0] : n[1],
             swap ? [n[2][1], n[2][0], n[2][3], n[2][2]] : n[2],
             n[5] == "" ? "" : ((n[5] == "u") != swap ? "x" : "y"), n[7]]],

        // rails: one or more pieces per drawer side that has wall ends
        wall_h = dd_wall_height(p, slip),
        rail_w = min(wall_h, dd(o, "height")),
        uEdges = rail ? [len(vsi[0]) > 0, len(vsi[ncol - 1]) > 0] : [false, false],
        vEdges = rail ? [ncol > 1, ncol > 1] : [false, false],
        sides = [for (s = [["L", swap ? vEdges[0] : uEdges[0]], ["R", swap ? vEdges[1] : uEdges[1]],
                           ["F", swap ? uEdges[0] : vEdges[0]], ["B", swap ? uEdges[1] : vEdges[1]]]) if (s[1]) s[0]],
        pitch = tt + dd_slot_w(p),
        rails = [for (side = sides)
            let(axis = side == "L" || side == "R" ? "y" : "x",
                sp = dd_lay_rail_span(axis, W, D, rt),
                first = sp[0] + dd_rail_center_offset(sp[1], p, tt),
                k = ceil(sp[1] / maxlen), pl = sp[1] / k)
            for (i = [0 : k - 1])
                let(ps = sp[0] + i * pl)
                [side, ps, ps + pl, pl, ((first - ps) % pitch + pitch) % pitch, i < k - 1, i > 0,
                 max(1, round(pl / 70))]],

        // compartments with their net (inside) size
        comps = [for (i = [0 : ncol - 1])
            let(vs = concat([base], vsi[i], [V - base]), u0 = us[i], u1 = us[i + 1])
            for (k = [0 : len(vs) - 2])
                let(v0 = vs[k], v1 = vs[k + 1],
                    so = [for (c = [[u0, U], [u1, U], [v0, V], [v1, V]])
                             abs(c[0]) < dd_le() || abs(c[0] - c[1]) < dd_le() ? (rail ? rt : 0) : t / 2],
                    nu = u1 - u0 - so[0] - so[1], nv = v1 - v0 - so[2] - so[3])
                swap ? [v0, u0, v1, u1, nv, nu] : [u0, v0, u1, v1, nu, nv]]
    ) [
        ["walls", walls], ["conns", conns], ["rails", rails], ["comps", comps],
        ["wall_h", wall_h], ["rail_w", rail_w], ["rail_t", rt], ["inset", B]
    ];

// ---- parts list ------------------------------------------------------------
function dd_wall_len_round(l) = floor(l * 10 + 0.05) / 10;

// Connectors whose bodies overlap: on one line each reaches an arm length towards
// its neighbour where it has an arm, half its width where it has none.
// Returns the indices into dd(L, "conns") that collide with another connector.
function dd_layout_clashes(L, p) =
    let(cs = dd(L, "conns"), n = len(cs), arm = dd(p, "arm"), aw = dd_arm_w(p),
        reach = function(d, i) d[i] ? arm : aw / 2,
        hit = function(a, b)
            let(sameY = abs(a[2] - b[2]) < dd_le(), sameX = abs(a[1] - b[1]) < dd_le(),
                lo = sameY ? (a[1] < b[1] ? a : b) : (a[2] < b[2] ? a : b),
                hi = lo == a ? b : a)
            sameY ? hi[1] - lo[1] < reach(lo[3], 0) + reach(hi[3], 2) + 1 - dd_le()
          : sameX ? hi[2] - lo[2] < reach(lo[3], 1) + reach(hi[3], 3) + 1 - dd_le()
          : false)
    [for (i = [0 : 1 : n - 1]) if (len([for (j = [0 : 1 : n - 1]) if (j != i && hit(cs[i], cs[j])) 1]) > 0) i];

// [[kind "c"|"w"|"r", spec, qty], ...] – connectors, then walls (longest first), then rails
function dd_layout_bom(L) =
    let(conns = dd(L, "conns"), walls = dd(L, "walls"), rails = dd(L, "rails"),
        ctypes = [for (c = conns) c[0]],
        lens   = [for (w = walls) if (w[4] > 0) dd_wall_len_round(w[4])],
        ulens  = dd_uniq_sorted(dd_sort(lens)),
        rspec  = [for (r = rails) [round(r[3] * 100) / 100, round(r[4] * 100) / 100, r[5], r[6], r[7]]])
    concat(
        [for (t = dd_connector_types()) if (dd_count(ctypes, t) > 0) ["c", t, dd_count(ctypes, t)]],
        [for (k = [len(ulens) - 1 : -1 : 0]) ["w", ulens[k], len([for (l = lens) if (abs(l - ulens[k]) < dd_le()) 1])]],
        [for (r = dd_unique(rspec)) ["r", r, dd_count(rspec, r)]]);
